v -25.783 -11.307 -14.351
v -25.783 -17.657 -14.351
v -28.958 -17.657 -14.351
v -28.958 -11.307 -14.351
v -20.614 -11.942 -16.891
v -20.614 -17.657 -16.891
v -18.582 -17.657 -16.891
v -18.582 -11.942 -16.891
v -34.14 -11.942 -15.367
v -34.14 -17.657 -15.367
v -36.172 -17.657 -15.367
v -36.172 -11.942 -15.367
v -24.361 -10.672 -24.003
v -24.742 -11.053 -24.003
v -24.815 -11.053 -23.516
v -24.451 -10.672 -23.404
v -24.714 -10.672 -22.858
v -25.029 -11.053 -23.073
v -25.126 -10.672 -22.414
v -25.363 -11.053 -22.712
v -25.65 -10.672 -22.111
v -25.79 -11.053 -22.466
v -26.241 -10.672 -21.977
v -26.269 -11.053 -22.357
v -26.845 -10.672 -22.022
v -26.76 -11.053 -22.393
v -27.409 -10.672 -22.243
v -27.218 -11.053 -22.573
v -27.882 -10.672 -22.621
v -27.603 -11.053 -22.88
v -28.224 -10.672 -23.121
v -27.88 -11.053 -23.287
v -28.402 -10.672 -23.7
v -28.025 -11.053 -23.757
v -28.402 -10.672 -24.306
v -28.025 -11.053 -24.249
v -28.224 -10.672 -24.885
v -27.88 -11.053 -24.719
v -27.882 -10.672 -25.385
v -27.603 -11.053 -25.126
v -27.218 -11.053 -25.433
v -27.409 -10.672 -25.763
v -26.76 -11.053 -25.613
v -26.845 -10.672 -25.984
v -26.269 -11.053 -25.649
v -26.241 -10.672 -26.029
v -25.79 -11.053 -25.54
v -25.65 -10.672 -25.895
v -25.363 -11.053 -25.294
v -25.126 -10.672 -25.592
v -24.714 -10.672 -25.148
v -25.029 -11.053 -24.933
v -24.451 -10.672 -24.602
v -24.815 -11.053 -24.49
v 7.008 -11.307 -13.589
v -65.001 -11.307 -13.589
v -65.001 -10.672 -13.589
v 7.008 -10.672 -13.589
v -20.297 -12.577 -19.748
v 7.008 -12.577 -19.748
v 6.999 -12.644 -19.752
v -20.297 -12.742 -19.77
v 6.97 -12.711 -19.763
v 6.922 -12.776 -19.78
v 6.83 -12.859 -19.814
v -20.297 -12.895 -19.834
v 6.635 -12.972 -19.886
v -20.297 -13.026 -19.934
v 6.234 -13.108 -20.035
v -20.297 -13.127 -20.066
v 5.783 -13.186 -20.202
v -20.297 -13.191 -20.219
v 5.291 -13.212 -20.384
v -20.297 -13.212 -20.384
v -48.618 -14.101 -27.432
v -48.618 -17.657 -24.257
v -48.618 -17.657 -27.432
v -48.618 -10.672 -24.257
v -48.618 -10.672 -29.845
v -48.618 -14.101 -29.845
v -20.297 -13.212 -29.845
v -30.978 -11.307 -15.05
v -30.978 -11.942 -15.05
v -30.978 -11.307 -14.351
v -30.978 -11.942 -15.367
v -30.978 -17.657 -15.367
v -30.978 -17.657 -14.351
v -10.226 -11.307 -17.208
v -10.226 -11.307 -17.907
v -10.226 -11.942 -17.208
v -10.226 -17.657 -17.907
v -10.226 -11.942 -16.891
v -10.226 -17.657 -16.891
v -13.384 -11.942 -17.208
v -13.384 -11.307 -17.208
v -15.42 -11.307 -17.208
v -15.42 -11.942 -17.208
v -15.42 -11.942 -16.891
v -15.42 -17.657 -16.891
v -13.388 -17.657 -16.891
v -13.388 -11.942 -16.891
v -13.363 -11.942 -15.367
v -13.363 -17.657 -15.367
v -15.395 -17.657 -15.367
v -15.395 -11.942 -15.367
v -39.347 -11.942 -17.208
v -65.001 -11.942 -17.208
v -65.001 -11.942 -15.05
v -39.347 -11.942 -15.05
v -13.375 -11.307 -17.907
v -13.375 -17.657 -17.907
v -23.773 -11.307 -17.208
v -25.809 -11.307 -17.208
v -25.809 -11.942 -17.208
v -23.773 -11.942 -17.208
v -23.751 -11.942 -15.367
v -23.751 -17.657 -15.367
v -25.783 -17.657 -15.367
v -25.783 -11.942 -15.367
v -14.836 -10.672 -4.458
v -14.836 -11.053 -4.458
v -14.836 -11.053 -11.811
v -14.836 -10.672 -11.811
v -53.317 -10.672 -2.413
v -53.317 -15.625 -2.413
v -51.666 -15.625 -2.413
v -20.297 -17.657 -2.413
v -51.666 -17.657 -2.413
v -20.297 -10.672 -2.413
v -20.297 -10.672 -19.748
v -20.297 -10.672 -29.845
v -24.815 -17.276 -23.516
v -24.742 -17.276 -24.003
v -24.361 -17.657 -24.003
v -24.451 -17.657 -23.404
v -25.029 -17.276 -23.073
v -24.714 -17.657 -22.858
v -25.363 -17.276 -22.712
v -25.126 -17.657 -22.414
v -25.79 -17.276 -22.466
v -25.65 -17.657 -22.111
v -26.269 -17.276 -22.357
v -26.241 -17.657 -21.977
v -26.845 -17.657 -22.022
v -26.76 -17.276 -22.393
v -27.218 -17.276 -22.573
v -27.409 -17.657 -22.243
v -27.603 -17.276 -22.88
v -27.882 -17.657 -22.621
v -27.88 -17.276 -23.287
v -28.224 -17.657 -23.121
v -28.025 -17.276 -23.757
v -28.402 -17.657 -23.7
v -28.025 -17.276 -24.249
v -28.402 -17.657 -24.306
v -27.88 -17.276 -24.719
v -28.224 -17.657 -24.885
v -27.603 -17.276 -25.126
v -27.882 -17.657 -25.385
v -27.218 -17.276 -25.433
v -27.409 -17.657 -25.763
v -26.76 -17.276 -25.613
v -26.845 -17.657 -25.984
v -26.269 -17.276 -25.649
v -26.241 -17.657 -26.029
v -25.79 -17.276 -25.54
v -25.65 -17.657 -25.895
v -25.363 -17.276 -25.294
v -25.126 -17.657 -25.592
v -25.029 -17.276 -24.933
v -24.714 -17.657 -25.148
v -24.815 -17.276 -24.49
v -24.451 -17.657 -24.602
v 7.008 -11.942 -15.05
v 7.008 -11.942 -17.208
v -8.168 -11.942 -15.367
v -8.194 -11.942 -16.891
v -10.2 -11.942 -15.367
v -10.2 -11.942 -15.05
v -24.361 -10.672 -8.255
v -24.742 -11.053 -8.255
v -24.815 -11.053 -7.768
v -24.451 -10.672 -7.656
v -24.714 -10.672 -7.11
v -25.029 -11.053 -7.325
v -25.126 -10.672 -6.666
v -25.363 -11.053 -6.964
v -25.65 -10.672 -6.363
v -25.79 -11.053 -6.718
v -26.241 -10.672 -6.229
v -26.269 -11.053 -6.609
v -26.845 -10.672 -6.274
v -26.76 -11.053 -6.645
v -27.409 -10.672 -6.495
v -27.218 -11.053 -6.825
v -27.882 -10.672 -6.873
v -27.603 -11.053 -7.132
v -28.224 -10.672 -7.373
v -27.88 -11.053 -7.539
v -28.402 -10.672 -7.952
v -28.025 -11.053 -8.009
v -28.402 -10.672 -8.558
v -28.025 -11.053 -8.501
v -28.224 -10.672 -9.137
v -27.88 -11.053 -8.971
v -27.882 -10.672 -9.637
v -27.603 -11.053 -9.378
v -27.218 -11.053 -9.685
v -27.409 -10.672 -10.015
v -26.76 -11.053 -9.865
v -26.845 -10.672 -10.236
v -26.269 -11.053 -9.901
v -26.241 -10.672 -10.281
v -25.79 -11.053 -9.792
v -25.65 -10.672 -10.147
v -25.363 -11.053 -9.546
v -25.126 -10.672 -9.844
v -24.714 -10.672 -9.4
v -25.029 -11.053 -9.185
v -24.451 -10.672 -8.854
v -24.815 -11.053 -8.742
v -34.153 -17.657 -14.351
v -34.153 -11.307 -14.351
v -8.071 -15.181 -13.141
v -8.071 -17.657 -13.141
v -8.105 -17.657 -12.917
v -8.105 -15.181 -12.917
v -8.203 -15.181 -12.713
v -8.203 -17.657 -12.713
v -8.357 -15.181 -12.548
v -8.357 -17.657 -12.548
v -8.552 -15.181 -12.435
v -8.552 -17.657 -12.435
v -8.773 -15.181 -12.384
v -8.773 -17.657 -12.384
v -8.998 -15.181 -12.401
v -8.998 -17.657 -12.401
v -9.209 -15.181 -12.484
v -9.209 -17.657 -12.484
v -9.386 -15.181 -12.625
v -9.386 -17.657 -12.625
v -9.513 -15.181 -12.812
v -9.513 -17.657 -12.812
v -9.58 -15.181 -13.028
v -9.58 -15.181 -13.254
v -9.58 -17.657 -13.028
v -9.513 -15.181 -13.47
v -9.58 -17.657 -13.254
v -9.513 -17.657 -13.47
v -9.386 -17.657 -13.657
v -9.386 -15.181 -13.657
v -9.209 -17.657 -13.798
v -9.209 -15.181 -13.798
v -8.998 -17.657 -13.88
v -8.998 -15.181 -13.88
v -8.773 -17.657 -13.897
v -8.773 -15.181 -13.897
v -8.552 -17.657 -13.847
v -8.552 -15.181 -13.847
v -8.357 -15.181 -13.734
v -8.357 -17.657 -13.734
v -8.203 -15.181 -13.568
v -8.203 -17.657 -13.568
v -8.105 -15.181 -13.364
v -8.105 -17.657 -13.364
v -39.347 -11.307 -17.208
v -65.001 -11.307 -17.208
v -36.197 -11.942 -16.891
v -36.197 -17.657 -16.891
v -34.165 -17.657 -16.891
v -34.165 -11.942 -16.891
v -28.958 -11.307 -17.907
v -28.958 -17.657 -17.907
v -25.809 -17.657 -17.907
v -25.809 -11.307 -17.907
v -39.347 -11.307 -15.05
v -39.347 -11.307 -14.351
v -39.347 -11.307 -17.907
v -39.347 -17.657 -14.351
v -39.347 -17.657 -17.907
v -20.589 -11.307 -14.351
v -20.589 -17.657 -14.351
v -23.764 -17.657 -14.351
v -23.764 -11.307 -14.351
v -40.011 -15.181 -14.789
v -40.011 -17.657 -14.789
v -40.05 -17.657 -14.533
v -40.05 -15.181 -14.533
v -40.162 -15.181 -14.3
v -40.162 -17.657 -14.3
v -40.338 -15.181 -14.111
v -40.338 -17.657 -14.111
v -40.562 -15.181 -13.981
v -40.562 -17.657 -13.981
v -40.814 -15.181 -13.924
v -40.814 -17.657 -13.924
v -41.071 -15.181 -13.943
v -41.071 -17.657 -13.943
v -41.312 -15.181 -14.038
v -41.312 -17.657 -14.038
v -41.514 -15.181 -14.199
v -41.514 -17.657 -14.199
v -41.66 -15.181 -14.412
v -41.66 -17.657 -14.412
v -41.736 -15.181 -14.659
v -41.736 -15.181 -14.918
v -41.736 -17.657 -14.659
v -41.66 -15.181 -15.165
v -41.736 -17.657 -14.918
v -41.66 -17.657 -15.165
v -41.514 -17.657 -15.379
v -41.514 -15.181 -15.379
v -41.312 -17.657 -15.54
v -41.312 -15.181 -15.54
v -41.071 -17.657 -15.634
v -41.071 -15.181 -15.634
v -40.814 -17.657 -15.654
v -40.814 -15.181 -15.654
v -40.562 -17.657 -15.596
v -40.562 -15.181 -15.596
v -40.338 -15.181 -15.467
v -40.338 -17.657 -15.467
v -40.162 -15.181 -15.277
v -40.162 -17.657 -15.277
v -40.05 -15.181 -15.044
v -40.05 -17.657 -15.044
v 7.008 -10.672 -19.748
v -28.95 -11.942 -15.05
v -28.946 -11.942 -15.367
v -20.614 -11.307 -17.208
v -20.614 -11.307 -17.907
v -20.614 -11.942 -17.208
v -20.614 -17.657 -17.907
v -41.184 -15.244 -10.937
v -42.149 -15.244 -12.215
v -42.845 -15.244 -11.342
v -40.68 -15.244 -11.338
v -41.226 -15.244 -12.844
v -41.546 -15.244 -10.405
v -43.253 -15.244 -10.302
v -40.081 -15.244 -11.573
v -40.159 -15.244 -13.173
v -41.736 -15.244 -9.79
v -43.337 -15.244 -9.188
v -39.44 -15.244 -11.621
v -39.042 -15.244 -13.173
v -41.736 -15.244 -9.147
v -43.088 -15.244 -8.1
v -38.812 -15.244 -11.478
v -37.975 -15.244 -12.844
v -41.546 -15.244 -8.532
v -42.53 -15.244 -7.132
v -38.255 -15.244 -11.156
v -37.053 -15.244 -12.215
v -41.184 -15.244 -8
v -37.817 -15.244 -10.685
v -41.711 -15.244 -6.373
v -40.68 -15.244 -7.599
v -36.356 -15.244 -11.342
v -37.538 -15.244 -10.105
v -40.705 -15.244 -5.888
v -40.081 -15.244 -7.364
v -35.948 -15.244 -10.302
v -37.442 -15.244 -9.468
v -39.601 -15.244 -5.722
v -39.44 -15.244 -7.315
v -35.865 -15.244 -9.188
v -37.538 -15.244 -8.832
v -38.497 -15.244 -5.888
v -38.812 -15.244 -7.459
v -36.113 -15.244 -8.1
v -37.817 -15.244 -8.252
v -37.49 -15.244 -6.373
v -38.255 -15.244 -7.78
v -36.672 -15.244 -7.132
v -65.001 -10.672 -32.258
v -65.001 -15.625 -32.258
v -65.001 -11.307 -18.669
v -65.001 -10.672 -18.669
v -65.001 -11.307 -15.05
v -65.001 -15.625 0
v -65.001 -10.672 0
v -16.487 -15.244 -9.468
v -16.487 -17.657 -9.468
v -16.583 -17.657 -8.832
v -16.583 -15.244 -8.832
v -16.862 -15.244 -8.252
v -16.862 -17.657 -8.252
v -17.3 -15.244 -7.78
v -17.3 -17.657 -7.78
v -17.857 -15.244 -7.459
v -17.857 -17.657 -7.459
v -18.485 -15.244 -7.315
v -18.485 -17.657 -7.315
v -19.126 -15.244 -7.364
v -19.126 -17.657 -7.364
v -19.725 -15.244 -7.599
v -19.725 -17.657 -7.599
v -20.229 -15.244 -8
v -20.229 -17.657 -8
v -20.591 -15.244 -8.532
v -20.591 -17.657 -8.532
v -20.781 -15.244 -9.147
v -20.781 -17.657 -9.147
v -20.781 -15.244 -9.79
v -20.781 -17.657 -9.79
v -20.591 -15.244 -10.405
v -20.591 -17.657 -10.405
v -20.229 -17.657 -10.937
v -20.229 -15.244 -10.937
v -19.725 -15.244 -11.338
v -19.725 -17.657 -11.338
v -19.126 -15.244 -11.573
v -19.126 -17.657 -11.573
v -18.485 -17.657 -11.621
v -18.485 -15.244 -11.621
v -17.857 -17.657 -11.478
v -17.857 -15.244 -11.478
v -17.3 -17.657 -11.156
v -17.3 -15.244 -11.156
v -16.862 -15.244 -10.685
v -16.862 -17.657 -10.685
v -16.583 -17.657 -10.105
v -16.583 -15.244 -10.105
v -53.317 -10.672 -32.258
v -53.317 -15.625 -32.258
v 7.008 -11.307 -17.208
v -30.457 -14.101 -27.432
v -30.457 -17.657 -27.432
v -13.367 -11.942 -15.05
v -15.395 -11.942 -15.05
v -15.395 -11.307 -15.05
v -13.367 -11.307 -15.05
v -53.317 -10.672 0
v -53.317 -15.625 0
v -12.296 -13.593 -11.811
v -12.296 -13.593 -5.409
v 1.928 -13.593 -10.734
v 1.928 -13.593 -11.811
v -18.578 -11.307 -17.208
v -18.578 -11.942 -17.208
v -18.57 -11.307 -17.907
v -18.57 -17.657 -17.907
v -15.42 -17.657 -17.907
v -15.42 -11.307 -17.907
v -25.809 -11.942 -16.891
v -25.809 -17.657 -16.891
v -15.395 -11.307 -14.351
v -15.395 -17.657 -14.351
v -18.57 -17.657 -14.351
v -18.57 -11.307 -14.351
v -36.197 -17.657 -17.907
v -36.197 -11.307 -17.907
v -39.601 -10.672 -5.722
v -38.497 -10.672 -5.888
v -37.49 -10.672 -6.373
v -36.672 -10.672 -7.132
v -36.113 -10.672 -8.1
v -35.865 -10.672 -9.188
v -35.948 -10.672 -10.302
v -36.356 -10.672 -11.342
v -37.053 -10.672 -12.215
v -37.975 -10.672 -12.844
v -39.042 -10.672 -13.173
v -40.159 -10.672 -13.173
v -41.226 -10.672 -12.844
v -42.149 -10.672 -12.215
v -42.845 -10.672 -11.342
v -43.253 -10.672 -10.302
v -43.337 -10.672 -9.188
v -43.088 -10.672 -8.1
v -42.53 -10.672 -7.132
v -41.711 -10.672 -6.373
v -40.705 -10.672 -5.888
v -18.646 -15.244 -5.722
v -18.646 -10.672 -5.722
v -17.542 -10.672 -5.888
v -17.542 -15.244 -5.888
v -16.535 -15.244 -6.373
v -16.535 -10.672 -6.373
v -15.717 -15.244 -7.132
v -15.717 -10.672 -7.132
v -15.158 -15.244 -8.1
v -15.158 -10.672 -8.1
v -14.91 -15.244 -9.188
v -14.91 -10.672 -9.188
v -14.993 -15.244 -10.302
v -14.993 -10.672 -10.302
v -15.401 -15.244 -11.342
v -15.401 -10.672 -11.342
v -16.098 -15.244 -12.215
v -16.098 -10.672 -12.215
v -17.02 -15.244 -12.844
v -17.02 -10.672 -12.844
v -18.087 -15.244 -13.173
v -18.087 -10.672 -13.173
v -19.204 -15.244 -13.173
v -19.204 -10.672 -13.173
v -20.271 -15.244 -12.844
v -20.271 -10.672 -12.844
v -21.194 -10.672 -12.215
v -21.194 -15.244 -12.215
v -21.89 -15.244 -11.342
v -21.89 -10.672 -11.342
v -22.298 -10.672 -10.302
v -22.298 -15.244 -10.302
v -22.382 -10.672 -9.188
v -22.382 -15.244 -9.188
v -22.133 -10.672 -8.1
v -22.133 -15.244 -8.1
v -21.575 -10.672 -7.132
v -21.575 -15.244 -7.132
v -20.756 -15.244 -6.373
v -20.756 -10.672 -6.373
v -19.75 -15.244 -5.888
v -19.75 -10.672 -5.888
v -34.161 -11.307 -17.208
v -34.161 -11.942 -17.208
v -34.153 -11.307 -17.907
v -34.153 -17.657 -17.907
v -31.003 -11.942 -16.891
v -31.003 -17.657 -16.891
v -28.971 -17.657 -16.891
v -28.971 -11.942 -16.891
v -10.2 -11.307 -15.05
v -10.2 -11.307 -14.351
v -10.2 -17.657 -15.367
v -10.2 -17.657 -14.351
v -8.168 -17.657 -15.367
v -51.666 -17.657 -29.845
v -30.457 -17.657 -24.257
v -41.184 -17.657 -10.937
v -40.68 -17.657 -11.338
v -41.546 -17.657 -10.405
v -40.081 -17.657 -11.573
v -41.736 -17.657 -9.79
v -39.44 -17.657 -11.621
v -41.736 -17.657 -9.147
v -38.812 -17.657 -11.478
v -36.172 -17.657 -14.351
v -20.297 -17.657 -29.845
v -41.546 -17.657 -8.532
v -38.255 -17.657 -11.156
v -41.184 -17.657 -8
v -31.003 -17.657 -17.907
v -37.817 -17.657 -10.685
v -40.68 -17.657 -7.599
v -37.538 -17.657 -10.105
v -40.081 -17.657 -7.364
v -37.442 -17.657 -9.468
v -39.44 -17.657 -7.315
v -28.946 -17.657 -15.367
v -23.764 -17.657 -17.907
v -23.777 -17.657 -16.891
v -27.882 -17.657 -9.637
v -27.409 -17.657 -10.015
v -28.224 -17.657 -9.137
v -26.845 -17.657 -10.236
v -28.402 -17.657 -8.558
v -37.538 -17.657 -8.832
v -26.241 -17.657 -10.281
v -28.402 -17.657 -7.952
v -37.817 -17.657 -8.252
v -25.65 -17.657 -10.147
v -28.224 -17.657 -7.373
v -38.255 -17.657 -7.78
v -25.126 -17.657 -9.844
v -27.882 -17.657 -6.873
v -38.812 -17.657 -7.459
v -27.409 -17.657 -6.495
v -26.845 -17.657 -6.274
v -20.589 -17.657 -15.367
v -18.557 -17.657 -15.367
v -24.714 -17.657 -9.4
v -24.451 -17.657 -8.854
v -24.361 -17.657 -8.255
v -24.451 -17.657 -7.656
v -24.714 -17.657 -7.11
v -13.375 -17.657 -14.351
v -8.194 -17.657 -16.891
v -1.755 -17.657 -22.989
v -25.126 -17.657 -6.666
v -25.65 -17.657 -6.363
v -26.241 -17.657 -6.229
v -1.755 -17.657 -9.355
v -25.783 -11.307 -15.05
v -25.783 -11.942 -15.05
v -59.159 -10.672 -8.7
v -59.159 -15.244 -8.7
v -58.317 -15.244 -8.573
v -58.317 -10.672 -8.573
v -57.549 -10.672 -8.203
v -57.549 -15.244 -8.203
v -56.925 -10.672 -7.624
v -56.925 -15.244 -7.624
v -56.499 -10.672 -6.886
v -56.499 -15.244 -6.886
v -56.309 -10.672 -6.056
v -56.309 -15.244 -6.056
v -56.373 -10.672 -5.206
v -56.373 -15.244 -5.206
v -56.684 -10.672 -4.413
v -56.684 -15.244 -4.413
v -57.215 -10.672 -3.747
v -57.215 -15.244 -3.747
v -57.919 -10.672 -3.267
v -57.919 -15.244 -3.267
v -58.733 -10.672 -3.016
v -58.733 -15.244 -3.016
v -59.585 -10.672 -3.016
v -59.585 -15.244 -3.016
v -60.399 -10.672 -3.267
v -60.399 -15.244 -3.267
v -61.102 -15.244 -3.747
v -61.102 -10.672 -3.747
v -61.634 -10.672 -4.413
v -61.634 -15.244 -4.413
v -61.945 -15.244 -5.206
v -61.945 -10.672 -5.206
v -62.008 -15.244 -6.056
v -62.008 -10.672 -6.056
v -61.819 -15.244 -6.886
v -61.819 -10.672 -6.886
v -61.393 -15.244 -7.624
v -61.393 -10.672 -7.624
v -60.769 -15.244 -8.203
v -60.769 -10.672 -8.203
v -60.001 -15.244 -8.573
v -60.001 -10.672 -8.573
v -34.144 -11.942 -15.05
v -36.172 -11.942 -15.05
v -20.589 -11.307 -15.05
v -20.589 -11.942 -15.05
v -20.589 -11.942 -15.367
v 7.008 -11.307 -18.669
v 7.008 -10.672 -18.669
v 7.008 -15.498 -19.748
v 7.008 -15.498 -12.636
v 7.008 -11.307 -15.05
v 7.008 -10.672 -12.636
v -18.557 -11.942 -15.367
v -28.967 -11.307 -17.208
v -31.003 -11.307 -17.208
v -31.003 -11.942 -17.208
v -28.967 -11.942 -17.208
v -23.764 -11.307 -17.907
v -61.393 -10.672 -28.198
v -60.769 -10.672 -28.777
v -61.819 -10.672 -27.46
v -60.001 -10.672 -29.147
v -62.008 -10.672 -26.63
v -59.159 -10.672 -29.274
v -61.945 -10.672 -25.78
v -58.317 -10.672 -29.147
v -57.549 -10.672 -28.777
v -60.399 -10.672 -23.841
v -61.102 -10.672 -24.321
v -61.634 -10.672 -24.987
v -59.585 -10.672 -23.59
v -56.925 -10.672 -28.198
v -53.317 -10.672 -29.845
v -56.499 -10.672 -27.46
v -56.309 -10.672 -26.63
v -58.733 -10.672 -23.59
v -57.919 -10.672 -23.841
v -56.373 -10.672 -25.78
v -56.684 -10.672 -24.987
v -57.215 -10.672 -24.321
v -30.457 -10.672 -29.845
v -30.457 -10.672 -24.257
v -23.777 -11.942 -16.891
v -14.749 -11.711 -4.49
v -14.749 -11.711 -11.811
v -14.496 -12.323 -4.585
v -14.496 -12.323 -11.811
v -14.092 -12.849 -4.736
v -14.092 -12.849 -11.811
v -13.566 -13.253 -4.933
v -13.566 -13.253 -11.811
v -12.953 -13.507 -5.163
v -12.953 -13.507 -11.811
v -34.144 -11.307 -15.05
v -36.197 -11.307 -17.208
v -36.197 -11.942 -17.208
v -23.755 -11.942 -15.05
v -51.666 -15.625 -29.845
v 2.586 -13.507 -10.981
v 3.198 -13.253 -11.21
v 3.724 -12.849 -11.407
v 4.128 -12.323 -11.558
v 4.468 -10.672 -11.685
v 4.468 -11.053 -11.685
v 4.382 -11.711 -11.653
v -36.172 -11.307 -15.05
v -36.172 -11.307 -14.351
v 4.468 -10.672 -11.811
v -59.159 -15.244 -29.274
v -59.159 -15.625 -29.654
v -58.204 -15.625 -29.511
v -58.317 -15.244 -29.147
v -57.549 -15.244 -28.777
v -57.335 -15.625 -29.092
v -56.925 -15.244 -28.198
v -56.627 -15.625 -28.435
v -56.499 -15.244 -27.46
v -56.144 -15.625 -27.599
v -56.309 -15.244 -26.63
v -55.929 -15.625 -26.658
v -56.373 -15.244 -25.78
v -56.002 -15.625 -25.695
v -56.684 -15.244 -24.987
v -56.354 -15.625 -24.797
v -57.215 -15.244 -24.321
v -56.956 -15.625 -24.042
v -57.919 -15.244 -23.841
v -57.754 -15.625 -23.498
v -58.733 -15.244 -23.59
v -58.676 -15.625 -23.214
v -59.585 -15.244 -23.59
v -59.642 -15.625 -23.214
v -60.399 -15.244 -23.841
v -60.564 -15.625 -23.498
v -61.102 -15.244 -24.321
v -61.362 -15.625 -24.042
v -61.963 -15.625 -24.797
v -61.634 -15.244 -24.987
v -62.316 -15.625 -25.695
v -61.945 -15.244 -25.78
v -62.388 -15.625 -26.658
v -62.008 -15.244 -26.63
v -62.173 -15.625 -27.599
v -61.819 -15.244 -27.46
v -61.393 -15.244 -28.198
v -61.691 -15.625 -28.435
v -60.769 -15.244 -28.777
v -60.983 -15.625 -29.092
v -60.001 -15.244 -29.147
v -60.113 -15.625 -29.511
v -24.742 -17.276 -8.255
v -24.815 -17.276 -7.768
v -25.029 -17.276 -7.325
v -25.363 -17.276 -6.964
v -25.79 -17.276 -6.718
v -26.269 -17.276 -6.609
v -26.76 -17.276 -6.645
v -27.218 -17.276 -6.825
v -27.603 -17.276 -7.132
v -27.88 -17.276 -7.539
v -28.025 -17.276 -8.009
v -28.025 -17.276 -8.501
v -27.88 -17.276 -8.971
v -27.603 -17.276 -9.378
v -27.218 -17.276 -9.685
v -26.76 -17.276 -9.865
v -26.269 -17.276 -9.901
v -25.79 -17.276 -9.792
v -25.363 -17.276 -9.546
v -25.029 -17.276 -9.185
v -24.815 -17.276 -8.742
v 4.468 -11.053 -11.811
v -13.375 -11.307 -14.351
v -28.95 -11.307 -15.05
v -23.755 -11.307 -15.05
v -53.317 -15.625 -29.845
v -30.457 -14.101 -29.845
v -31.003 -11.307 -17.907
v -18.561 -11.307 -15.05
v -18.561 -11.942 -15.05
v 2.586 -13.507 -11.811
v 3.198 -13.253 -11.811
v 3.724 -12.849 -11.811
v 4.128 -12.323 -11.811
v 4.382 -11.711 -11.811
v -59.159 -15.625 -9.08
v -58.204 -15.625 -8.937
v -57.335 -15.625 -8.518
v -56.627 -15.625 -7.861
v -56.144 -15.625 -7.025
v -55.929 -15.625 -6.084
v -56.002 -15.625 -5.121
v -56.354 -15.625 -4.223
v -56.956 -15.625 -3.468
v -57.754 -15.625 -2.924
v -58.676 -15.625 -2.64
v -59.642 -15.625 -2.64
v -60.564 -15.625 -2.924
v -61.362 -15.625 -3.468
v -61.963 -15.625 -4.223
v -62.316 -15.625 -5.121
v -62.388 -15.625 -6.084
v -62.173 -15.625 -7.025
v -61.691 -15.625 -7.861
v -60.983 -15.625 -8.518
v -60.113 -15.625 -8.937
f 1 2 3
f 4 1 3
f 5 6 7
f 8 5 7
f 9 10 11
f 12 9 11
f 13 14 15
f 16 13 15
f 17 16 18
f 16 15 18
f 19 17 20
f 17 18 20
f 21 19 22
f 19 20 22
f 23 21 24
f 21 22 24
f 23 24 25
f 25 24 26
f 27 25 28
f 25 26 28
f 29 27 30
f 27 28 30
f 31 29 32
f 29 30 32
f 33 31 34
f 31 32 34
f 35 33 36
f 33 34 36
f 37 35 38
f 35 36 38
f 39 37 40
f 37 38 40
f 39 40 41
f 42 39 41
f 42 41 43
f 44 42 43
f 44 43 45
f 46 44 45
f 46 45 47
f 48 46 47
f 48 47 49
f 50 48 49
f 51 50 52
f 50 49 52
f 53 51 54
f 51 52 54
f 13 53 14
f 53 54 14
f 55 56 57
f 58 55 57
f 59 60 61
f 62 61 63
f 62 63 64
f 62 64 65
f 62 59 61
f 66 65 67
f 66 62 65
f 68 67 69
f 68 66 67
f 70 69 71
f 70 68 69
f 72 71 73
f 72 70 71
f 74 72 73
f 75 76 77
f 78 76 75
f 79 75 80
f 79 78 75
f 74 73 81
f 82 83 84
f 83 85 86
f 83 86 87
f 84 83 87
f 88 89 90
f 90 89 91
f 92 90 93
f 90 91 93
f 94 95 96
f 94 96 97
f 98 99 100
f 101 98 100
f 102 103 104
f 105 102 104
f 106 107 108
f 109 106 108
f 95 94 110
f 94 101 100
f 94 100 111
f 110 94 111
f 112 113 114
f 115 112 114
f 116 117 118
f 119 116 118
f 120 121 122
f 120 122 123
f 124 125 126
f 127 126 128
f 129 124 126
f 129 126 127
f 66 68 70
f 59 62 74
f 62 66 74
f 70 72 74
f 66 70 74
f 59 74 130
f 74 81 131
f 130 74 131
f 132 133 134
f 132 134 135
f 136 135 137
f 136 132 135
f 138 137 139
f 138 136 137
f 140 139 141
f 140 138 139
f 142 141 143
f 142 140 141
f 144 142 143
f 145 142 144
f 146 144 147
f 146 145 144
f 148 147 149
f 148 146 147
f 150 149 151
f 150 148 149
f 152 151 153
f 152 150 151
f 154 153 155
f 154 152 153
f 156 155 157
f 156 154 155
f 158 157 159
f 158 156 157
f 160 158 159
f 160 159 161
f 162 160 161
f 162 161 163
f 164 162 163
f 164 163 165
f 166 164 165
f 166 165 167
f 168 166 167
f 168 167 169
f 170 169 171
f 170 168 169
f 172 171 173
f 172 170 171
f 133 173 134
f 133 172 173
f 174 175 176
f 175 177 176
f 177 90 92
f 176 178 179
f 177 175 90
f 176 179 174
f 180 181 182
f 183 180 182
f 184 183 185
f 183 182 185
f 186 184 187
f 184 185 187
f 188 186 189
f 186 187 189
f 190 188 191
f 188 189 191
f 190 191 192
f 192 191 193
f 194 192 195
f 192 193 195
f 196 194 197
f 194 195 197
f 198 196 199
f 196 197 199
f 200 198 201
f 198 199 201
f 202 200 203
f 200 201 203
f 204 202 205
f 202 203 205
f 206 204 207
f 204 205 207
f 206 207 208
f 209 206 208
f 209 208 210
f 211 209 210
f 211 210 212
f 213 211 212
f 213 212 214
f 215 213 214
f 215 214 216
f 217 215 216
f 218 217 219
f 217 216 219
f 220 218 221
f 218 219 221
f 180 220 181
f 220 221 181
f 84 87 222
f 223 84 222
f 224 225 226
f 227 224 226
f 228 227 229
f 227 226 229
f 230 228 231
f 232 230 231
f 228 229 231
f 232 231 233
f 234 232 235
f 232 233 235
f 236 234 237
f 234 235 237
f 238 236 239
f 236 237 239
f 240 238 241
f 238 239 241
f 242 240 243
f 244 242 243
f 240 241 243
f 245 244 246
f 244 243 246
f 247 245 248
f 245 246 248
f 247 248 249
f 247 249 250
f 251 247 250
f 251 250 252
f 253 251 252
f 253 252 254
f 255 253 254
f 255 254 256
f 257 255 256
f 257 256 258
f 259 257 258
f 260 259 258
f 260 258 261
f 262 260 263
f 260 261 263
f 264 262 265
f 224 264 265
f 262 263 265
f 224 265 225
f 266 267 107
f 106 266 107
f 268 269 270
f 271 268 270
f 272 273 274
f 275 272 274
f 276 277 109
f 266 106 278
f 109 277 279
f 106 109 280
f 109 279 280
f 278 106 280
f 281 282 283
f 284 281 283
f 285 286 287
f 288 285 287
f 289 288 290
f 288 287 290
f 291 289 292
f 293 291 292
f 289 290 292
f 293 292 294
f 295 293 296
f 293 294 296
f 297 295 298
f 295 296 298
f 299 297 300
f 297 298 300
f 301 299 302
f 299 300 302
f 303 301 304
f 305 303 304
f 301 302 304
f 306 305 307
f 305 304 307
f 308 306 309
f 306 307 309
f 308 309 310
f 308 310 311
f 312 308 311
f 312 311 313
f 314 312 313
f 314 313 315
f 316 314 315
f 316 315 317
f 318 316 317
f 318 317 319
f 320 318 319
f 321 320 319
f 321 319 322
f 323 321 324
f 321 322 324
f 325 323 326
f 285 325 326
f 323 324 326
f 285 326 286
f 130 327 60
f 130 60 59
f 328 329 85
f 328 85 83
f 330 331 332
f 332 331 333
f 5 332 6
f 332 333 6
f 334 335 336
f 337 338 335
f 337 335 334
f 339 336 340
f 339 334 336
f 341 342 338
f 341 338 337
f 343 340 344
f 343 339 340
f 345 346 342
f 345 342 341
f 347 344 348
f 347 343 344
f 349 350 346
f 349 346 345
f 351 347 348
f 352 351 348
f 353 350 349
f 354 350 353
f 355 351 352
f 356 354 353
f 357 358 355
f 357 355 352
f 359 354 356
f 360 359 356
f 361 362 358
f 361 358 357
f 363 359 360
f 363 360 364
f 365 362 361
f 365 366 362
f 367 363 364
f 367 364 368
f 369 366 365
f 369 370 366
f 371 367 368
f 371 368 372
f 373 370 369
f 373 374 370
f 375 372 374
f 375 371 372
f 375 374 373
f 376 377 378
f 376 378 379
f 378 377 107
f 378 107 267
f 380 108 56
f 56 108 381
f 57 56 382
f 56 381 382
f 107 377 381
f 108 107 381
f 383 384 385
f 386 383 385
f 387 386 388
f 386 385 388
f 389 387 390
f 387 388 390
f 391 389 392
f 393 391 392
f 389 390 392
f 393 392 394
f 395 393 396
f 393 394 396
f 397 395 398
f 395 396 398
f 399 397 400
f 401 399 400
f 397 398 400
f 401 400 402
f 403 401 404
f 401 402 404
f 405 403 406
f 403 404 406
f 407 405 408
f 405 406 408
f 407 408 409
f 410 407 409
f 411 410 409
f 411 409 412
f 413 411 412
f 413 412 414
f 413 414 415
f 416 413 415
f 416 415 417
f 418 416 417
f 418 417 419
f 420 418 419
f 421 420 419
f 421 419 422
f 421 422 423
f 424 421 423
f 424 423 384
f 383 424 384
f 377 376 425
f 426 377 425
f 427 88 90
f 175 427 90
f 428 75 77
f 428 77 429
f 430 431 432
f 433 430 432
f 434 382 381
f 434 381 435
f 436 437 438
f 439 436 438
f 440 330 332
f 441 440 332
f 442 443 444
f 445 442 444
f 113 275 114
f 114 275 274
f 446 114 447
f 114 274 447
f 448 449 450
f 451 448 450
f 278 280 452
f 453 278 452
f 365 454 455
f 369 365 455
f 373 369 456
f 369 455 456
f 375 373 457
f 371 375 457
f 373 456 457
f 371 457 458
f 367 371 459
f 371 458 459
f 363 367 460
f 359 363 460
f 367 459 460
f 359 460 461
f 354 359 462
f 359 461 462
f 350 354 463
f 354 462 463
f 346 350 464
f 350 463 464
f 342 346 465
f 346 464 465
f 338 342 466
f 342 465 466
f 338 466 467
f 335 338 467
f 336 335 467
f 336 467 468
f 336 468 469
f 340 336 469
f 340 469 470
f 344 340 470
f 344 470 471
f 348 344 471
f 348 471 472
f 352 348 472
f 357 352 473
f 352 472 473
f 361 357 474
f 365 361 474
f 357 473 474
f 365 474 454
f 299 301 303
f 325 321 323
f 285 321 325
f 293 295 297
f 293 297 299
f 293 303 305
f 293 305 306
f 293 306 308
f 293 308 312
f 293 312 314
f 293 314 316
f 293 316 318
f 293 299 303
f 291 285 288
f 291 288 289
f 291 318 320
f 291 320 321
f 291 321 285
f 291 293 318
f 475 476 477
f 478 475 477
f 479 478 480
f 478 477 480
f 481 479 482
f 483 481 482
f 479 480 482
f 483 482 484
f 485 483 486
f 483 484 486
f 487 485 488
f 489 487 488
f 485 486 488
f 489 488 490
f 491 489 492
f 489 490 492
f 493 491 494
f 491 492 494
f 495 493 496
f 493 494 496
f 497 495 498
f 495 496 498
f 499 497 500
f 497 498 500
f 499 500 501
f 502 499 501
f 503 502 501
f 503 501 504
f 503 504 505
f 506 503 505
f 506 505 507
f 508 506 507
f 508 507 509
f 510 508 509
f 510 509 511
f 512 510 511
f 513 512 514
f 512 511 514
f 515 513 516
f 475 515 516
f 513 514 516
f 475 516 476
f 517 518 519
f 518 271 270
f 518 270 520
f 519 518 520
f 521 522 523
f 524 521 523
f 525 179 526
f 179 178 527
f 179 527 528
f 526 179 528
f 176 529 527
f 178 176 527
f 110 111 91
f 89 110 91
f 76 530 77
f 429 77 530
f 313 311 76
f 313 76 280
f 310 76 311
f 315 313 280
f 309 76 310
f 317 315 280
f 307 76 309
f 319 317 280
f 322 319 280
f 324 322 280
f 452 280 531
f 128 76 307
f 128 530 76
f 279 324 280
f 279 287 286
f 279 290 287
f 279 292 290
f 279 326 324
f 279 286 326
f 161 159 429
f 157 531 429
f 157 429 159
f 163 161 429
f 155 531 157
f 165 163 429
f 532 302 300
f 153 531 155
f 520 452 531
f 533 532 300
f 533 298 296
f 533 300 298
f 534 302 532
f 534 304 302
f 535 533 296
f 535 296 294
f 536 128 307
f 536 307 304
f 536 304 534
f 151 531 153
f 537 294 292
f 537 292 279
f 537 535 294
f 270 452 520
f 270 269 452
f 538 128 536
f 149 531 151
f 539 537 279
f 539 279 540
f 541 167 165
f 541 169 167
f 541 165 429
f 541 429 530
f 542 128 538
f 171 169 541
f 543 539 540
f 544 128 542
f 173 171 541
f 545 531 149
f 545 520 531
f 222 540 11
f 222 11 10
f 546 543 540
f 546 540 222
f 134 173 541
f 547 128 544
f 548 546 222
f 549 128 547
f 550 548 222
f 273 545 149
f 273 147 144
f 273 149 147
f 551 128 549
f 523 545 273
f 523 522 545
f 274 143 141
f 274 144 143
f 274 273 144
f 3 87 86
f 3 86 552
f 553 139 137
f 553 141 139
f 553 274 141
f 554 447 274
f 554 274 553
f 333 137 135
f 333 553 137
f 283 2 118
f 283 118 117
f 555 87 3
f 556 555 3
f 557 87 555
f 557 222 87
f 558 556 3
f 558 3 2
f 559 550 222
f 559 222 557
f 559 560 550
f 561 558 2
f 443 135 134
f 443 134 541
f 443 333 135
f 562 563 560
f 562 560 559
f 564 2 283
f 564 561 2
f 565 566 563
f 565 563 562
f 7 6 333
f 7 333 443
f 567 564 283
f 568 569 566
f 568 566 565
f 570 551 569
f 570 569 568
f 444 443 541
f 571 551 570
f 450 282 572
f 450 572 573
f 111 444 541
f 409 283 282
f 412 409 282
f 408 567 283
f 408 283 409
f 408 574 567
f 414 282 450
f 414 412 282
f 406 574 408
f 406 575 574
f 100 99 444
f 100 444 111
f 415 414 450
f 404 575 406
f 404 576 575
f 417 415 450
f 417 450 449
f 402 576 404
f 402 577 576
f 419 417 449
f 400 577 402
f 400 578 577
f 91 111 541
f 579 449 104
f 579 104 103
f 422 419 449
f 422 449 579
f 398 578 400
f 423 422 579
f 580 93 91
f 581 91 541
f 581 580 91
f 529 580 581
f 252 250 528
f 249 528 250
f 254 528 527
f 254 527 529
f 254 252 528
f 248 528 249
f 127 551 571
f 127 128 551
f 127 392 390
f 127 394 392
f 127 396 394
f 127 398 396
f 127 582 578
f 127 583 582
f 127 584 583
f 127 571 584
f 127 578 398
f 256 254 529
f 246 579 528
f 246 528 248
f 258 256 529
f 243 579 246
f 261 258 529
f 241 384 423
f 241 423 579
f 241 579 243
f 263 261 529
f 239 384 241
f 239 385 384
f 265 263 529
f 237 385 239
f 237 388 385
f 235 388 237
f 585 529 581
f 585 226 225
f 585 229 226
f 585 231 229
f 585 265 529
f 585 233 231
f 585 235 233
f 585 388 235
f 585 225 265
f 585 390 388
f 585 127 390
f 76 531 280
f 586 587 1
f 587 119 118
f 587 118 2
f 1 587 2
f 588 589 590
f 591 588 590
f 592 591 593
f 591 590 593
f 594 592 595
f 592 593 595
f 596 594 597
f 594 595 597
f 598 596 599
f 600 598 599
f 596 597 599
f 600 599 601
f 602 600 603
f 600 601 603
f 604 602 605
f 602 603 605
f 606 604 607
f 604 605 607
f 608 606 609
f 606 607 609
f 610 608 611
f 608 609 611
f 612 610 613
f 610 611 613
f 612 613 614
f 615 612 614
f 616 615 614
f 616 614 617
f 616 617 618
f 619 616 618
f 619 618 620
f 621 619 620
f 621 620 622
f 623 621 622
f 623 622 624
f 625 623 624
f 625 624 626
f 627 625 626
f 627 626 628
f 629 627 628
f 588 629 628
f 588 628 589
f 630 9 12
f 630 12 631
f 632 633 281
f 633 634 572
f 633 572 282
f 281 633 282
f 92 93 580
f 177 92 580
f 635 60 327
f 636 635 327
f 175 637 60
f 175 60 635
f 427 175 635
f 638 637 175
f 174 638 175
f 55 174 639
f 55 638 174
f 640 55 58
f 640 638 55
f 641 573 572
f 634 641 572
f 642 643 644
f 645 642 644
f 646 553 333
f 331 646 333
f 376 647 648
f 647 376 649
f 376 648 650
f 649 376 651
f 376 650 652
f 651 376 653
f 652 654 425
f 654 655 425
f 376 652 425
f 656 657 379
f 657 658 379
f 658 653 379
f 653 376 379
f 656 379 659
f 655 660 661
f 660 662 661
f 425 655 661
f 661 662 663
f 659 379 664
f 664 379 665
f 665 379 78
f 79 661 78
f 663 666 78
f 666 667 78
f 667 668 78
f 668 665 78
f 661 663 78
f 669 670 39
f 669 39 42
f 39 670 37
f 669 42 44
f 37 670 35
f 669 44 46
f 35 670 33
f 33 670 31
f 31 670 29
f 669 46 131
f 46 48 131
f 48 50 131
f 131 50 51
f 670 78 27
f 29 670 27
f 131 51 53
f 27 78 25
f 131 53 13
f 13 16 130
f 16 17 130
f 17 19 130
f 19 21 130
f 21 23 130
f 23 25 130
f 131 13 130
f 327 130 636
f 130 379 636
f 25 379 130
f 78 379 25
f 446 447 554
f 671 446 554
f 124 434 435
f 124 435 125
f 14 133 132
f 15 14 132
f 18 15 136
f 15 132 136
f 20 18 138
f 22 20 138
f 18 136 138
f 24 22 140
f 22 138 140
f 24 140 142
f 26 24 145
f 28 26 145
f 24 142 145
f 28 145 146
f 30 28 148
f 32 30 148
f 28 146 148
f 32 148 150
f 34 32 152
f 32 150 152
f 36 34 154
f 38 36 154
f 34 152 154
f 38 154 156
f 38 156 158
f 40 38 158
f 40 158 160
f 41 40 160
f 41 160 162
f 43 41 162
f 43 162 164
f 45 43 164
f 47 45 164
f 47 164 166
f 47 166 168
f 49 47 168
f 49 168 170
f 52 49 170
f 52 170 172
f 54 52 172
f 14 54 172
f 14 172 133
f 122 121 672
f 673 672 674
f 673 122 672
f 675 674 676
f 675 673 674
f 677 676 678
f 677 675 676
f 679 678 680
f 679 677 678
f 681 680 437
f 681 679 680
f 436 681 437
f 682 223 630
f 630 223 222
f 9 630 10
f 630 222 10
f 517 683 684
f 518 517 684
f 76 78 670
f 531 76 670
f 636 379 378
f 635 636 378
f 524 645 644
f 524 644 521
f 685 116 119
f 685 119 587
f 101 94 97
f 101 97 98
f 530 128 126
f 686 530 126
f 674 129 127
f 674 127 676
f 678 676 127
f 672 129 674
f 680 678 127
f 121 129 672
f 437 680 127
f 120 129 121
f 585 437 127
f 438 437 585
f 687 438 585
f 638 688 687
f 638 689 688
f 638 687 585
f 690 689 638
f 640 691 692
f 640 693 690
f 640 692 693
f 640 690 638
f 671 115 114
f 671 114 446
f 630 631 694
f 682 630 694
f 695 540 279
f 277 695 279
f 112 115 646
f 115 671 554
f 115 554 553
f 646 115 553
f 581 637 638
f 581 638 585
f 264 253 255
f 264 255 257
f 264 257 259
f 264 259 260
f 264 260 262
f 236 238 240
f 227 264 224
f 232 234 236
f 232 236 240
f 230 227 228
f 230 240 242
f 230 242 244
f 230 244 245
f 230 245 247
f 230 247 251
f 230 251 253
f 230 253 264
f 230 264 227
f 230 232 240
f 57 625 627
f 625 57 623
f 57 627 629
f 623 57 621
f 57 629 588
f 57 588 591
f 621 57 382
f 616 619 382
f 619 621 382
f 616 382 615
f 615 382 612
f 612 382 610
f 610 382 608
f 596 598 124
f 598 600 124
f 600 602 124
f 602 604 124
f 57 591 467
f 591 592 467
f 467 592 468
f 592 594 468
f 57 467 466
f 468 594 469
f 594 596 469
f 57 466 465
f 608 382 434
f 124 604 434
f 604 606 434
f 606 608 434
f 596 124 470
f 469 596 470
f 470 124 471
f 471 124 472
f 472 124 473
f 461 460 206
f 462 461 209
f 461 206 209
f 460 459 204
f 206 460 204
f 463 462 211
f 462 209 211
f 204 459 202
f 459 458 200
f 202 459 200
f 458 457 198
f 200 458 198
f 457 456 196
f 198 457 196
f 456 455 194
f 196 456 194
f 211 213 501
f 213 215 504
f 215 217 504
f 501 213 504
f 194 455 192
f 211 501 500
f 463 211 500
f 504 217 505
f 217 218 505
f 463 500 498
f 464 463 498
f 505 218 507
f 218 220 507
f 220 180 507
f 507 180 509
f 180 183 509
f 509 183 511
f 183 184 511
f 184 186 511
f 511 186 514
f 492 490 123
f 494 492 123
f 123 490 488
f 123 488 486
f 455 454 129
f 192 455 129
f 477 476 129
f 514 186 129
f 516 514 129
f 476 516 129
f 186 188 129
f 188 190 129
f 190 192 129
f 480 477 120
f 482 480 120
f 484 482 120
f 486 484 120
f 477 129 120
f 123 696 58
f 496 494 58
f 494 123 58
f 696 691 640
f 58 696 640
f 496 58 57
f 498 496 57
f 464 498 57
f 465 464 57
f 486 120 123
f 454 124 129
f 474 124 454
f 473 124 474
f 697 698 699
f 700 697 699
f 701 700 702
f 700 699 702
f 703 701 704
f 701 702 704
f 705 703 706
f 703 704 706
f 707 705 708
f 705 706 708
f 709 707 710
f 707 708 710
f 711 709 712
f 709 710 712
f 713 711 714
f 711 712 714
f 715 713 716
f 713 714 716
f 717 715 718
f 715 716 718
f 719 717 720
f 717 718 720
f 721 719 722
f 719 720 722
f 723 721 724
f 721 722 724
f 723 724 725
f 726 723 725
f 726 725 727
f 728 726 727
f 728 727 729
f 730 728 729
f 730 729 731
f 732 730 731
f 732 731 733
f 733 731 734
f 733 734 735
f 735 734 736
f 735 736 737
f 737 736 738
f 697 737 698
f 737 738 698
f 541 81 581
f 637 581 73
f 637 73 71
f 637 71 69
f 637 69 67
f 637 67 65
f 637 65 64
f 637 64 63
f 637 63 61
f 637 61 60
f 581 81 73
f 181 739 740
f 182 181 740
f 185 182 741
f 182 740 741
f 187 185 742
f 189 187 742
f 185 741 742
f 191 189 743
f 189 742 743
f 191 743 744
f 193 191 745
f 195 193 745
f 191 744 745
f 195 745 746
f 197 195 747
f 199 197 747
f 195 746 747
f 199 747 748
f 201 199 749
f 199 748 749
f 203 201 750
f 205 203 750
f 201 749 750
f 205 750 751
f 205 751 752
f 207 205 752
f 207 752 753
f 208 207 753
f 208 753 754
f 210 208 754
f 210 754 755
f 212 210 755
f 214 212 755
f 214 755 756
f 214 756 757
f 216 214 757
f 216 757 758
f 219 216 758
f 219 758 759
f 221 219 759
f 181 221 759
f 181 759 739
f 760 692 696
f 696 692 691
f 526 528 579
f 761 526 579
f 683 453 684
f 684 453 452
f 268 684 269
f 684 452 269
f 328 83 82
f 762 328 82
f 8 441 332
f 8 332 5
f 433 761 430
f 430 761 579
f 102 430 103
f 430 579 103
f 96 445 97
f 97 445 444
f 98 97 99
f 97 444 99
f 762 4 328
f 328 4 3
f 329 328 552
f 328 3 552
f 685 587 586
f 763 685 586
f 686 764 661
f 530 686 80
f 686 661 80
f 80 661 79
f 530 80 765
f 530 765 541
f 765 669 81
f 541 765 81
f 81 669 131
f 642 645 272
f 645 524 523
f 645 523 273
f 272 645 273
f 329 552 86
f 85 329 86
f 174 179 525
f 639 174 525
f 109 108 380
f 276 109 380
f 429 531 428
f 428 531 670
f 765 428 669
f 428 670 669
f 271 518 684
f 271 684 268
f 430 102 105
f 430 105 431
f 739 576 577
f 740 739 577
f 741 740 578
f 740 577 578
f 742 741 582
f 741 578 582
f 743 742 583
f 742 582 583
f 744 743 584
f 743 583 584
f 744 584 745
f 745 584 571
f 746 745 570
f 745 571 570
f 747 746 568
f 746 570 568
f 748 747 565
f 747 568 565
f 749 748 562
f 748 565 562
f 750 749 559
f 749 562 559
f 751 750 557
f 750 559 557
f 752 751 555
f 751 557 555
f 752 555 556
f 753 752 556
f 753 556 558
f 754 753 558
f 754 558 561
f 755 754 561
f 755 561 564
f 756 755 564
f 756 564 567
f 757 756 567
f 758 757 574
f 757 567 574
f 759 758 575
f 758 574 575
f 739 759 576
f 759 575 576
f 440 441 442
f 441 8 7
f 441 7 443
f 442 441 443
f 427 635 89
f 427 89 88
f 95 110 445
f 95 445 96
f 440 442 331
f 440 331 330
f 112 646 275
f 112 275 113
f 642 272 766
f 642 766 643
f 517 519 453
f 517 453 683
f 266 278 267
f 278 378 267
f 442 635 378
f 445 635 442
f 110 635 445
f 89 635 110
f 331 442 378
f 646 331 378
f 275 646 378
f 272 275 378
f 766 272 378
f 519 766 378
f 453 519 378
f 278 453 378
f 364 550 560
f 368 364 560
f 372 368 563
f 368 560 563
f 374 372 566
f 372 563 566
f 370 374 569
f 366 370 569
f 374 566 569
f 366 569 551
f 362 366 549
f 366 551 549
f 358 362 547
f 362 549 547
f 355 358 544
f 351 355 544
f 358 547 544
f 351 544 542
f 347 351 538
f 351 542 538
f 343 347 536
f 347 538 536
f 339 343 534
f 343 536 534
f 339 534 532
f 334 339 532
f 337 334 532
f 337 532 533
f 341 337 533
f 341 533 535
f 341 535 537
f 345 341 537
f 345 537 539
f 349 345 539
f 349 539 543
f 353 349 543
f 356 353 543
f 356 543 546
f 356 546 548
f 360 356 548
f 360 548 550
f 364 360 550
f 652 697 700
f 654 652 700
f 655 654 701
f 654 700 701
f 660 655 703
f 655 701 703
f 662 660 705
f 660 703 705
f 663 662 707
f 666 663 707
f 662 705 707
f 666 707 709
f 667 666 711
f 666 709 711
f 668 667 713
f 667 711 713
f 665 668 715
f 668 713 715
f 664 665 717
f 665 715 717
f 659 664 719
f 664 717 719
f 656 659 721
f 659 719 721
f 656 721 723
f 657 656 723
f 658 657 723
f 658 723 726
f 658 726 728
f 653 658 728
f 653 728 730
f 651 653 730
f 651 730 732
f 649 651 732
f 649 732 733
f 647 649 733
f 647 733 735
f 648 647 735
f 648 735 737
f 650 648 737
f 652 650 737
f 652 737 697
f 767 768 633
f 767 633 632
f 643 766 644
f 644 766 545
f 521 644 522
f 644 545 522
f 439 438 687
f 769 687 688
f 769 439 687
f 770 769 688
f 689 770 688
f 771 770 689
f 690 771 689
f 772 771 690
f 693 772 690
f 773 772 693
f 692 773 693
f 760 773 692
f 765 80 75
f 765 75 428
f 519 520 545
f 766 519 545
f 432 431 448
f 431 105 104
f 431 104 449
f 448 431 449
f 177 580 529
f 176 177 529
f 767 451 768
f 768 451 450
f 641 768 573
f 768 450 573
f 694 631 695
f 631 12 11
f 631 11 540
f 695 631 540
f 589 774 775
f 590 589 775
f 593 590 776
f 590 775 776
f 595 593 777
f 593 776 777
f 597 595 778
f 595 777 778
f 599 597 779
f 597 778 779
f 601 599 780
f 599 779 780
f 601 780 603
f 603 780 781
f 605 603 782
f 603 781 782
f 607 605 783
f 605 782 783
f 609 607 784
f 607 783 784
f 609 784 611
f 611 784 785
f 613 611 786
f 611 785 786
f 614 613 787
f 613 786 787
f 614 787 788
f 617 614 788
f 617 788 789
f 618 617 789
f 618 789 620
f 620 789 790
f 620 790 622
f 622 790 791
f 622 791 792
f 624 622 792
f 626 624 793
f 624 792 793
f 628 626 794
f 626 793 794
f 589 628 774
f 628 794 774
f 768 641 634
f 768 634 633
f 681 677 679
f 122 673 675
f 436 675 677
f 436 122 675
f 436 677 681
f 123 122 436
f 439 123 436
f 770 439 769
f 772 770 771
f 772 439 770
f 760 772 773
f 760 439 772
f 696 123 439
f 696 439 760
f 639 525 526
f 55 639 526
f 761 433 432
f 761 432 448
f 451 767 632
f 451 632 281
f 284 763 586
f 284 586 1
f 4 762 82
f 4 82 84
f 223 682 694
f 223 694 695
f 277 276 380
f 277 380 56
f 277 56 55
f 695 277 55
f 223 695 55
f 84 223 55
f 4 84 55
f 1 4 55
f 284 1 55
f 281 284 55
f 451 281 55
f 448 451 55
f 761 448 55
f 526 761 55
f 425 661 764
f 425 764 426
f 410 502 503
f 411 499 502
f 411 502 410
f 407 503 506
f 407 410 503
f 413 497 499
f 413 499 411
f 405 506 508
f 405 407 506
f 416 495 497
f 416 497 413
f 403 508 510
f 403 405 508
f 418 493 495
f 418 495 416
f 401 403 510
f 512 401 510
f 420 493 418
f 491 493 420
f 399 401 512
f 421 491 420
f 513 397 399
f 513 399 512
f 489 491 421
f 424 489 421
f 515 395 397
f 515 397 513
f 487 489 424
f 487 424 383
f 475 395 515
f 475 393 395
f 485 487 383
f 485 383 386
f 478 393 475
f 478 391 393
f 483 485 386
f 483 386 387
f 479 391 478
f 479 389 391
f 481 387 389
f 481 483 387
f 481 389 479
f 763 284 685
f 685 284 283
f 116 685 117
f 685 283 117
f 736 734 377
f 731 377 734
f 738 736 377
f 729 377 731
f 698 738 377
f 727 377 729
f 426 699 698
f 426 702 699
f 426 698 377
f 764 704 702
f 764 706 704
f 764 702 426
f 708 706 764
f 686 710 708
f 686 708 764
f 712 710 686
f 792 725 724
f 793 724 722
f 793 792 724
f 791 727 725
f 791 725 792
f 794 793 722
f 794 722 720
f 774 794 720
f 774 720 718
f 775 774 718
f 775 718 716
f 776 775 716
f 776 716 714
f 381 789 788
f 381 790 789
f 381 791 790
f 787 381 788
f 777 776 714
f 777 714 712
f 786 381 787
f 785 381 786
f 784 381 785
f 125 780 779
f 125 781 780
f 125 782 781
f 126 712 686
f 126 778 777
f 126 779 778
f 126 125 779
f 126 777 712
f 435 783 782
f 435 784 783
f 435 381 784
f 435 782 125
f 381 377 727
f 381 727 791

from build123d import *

# Parameters (mm, degrees)
SKETCH1_W           = 72.009
SKETCH1_H           = 6.985
BOSS_EXTRUDE1_DEPTH = 32.258
SKETCH2_W           = 13.335
SKETCH2_H           = 2.032
CUT_EXTRUDE1_DEPTH  = 75.682449945
SKETCH3_W           = 19.304
SKETCH3_H           = 2.921
CUT_EXTRUDE2_DEPTH  = 11.811
FILLET1_R           = 2.54
CUT_EXTRUDE3_DEPTH  = 75.682449945
SKETCH6_W           = 60.325
SKETCH6_H           = 2.413
CUT_EXTRUDE6_DEPTH  = 73.900474235
SKETCH11_W          = 18.161
SKETCH11_H          = 5.588
CUT_EXTRUDE7_DEPTH  = 3.429
SKETCH12_W          = 18.161
SKETCH12_H          = 3.175
CUT_EXTRUDE8_DEPTH  = 73.652144185
SKETCH13_W          = 30.314137033
SKETCH13_H          = 2.54
CUT_EXTRUDE9_DEPTH  = 10.0965
CUT_EXTRUDE10_DEPTH = 73.900474235
FILLET2_R           = 0.635
CUT_EXTRUDE11_DEPTH = 81.85576081
CUT_EXTRUDE12_DEPTH = 73.900474235
SKETCH18_R          = 0.758626194
SKETCH18_R_2        = 0.86735546
CUT_EXTRUDE13_DEPTH = 2.4765
SKETCH19_R          = 2.8575
CUT_EXTRUDE14_DEPTH = 73.733906314
CHAMFER1_SIZE       = 0.381
SKETCH20_R          = 1.651
CUT_EXTRUDE15_DEPTH = 73.900474235
CHAMFER2_SIZE       = 0.381
SKETCH21_R          = 2.159
CUT_EXTRUDE16_DEPTH = 73.900474235
SKETCH22_R          = 3.7465
CUT_EXTRUDE17_DEPTH = 4.572


with BuildPart() as part:
    # Sketch1 → Boss-Extrude1 (new body)
    with BuildSketch(Plane.XY):
        with Locations((-28.996348877, -14.164776435)):
            Rectangle(SKETCH1_W, SKETCH1_H)
    extrude(amount=-BOSS_EXTRUDE1_DEPTH)

    # Sketch2 → Cut-Extrude1 (cut, through all)
    with BuildSketch(Plane.XY):
        with Locations((-58.333348877, -16.641276435)):
            Rectangle(SKETCH2_W, SKETCH2_H)
    extrude(amount=-CUT_EXTRUDE1_DEPTH, mode=Mode.SUBTRACT)

    # Sketch3 → Cut-Extrude2 (cut)
    with BuildSketch(Plane.XY):
        with Locations((-5.183848877, -12.132776435)):
            Rectangle(SKETCH3_W, SKETCH3_H)
    extrude(amount=-CUT_EXTRUDE2_DEPTH, mode=Mode.SUBTRACT)

    # Fillet1
    fillet1_edges = [part.edges().sort_by_distance(p)[0] for p in [
        (-14.835848877, -13.593276435, -5.9055),
        (4.468151123, -13.593276435, -5.9055),
    ]]
    fillet(fillet1_edges, radius=FILLET1_R)

    # Sketch4 → Cut-Extrude3 (cut, through all)
    with BuildSketch(Plane.XY):
        Polygon((7.008151123, -17.657276435), (7.008151123, -15.498276435), (-1.754848877, -17.657276435), align=None)
    extrude(amount=-CUT_EXTRUDE3_DEPTH, mode=Mode.SUBTRACT)

    # Sketch6 → Cut-Extrude6 (cut, through all)
    with BuildSketch(Plane(origin=(0, -10.672276435, 0), x_dir=(1, 0, 0), z_dir=(0, 1, 0))):
        with Locations((-23.154348877, 31.0515)):
            Rectangle(SKETCH6_W, SKETCH6_H)
        with Locations((-23.154348877, 1.2065)):
            Rectangle(SKETCH6_W, SKETCH6_H)
    extrude(amount=-CUT_EXTRUDE6_DEPTH, mode=Mode.SUBTRACT)

    # Sketch11 → Cut-Extrude7 (cut)
    with BuildSketch(Plane(origin=(0, -10.672276435, 0), x_dir=(1, 0, 0), z_dir=(0, 1, 0))):
        with Locations((-39.537348877, 27.051)):
            Rectangle(SKETCH11_W, SKETCH11_H)
    extrude(amount=-CUT_EXTRUDE7_DEPTH, mode=Mode.SUBTRACT)

    # Sketch12 → Cut-Extrude8 (cut, through all)
    with BuildSketch(Plane(origin=(0, -14.101276435, 0), x_dir=(1, 0, 0), z_dir=(0, 1, 0))):
        with Locations((-39.537348877, 25.8445)):
            Rectangle(SKETCH12_W, SKETCH12_H)
    extrude(amount=-CUT_EXTRUDE8_DEPTH, mode=Mode.SUBTRACT)

    # Sketch13 → Cut-Extrude9 (cut)
    with BuildSketch(Plane(origin=(0, 0, -29.845), x_dir=(-1, 0, 0), z_dir=(0, 0, -1))):
        with Locations((5.139780361, -11.942276435)):
            Rectangle(SKETCH13_W, SKETCH13_H)
    extrude(amount=-CUT_EXTRUDE9_DEPTH, mode=Mode.SUBTRACT)

    # Sketch14 → Cut-Extrude10 (cut, through all)
    with BuildSketch(Plane(origin=(0, -10.672276435, 0), x_dir=(1, 0, 0), z_dir=(0, 1, 0))):
        Polygon((-20.296848877, 29.845), (7.008151123, 19.7485), (7.008151123, 29.845), align=None)
        Polygon((-20.296848877, 2.413), (7.008151123, 12.6365), (7.008151123, 2.413), align=None)
    extrude(amount=-CUT_EXTRUDE10_DEPTH, mode=Mode.SUBTRACT)

    # Fillet2
    fillet2_edges = [part.edges().sort_by_distance(p)[0] for p in [
        (-6.644348877, -13.212276435, -19.7485),
    ]]
    fillet(fillet2_edges, radius=FILLET2_R)

    # Sketch16 → Cut-Extrude11 (cut, through all)
    with BuildSketch(Plane.ZY.offset(65.000848877)):
        Polygon((-17.2085, -11.942276435), (-15.0495, -11.942276435), (-15.0495, -11.307276435), (-13.589, -11.307276435), (-13.589, -10.672276435), (-18.669, -10.672276435), (-18.669, -11.307276435), (-17.2085, -11.307276435), align=None)
    extrude(amount=-CUT_EXTRUDE11_DEPTH, mode=Mode.SUBTRACT)

    # Sketch17 → Cut-Extrude12 (cut, through all)
    with BuildSketch(Plane.XZ.offset(17.657276435)):
        Polygon((-31.002948877, -16.891), (-28.970948877, -16.891), (-28.958248877, -17.907), (-25.808648877, -17.907), (-25.808648877, -16.891), (-23.776648877, -16.891), (-23.763948877, -17.907), (-20.614348877, -17.907), (-20.614348877, -16.891), (-18.582348877, -16.891), (-18.569648877, -17.907), (-15.420048877, -17.907), (-15.420048877, -16.891), (-13.388048877, -16.891), (-13.375348877, -17.907), (-10.225748877, -17.907), (-10.225748877, -16.891), (-8.193748877, -16.891), (-8.168348877, -15.367), (-10.200348877, -15.367), (-10.200348877, -14.351), (-13.375348877, -14.351), (-13.362648877, -15.367), (-15.394648877, -15.367), (-15.394648877, -14.351), (-18.569648877, -14.351), (-18.556948877, -15.367), (-20.588948877, -15.367), (-20.588948877, -14.351), (-23.763948877, -14.351), (-23.751248877, -15.367), (-25.783248877, -15.367), (-25.783248877, -14.351), (-28.958248877, -14.351), (-28.945548877, -15.367), (-30.977548877, -15.367), (-30.977548877, -14.351), (-34.152548877, -14.351), (-34.139848877, -15.367), (-36.171848877, -15.367), (-36.171848877, -14.351), (-39.346848877, -14.351), (-39.346848877, -17.907), (-36.197248877, -17.907), (-36.197248877, -16.891), (-34.165248877, -16.891), (-34.152548877, -17.907), (-31.002948877, -17.907), align=None)
    extrude(amount=-CUT_EXTRUDE12_DEPTH, mode=Mode.SUBTRACT)

    # Sketch18 → Cut-Extrude13 (cut)
    with BuildSketch(Plane.XZ.offset(17.657276435)):
        with Locations((-8.829621314, -13.140704274)):
            Circle(SKETCH18_R)
        with Locations((-40.878405559, -14.788679648)):
            Circle(SKETCH18_R_2)
    extrude(amount=-CUT_EXTRUDE13_DEPTH, mode=Mode.SUBTRACT)

    # Sketch19 → Cut-Extrude14 (cut, through all)
    with BuildSketch(Plane.XZ.offset(15.625276435)):
        with Locations(Location((-59.158848877, -5.842, 0), (0, 0, 270))):
            Circle(SKETCH19_R)
        with Locations(Location((-59.158848877, -26.416, 0), (0, 0, 270))):
            Circle(SKETCH19_R)
    extrude(amount=-CUT_EXTRUDE14_DEPTH, mode=Mode.SUBTRACT)

    # Chamfer1
    chamfer1_edges = [part.edges().sort_by_distance(p)[0] for p in [
        (-59.158848877, -15.625276435, -2.9845),
        (-59.158848877, -15.625276435, -23.5585),
    ]]
    chamfer(chamfer1_edges, length=CHAMFER1_SIZE)

    # Sketch20 → Cut-Extrude15 (cut, through all)
    with BuildSketch(Plane.XZ.offset(17.657276435)):
        with Locations((-26.392848877, -8.255)):
            Circle(SKETCH20_R)
        with Locations((-26.392848877, -24.003)):
            Circle(SKETCH20_R)
    extrude(amount=-CUT_EXTRUDE15_DEPTH, mode=Mode.SUBTRACT)

    # Chamfer2
    chamfer2_edges = [part.edges().sort_by_distance(p)[0] for p in [
        (-28.043848877, -10.672276435, -8.255),
        (-28.043848877, -17.657276435, -8.255),
        (-28.043848877, -10.672276435, -24.003),
        (-28.043848877, -17.657276435, -24.003),
    ]]
    chamfer(chamfer2_edges, length=CHAMFER2_SIZE)

    # Sketch21 → Cut-Extrude16 (cut, through all)
    with BuildSketch(Plane.XZ.offset(17.657276435)):
        with Locations((-39.600848877, -9.468375809)):
            Circle(SKETCH21_R)
        with Locations((-18.645848877, -9.468375809)):
            Circle(SKETCH21_R)
    extrude(amount=-CUT_EXTRUDE16_DEPTH, mode=Mode.SUBTRACT)

    # Sketch22 → Cut-Extrude17 (cut)
    with BuildSketch(Plane(origin=(0, -10.672276435, 0), x_dir=(1, 0, 0), z_dir=(0, 1, 0))):
        with Locations(Location((-39.600848877, 9.468375809, 0), (0, 0, 270))):
            Circle(SKETCH22_R)
        with Locations(Location((-18.645848877, 9.468375809, 0), (0, 0, 270))):
            Circle(SKETCH22_R)
    extrude(amount=-CUT_EXTRUDE17_DEPTH, mode=Mode.SUBTRACT)


solid = part.part
